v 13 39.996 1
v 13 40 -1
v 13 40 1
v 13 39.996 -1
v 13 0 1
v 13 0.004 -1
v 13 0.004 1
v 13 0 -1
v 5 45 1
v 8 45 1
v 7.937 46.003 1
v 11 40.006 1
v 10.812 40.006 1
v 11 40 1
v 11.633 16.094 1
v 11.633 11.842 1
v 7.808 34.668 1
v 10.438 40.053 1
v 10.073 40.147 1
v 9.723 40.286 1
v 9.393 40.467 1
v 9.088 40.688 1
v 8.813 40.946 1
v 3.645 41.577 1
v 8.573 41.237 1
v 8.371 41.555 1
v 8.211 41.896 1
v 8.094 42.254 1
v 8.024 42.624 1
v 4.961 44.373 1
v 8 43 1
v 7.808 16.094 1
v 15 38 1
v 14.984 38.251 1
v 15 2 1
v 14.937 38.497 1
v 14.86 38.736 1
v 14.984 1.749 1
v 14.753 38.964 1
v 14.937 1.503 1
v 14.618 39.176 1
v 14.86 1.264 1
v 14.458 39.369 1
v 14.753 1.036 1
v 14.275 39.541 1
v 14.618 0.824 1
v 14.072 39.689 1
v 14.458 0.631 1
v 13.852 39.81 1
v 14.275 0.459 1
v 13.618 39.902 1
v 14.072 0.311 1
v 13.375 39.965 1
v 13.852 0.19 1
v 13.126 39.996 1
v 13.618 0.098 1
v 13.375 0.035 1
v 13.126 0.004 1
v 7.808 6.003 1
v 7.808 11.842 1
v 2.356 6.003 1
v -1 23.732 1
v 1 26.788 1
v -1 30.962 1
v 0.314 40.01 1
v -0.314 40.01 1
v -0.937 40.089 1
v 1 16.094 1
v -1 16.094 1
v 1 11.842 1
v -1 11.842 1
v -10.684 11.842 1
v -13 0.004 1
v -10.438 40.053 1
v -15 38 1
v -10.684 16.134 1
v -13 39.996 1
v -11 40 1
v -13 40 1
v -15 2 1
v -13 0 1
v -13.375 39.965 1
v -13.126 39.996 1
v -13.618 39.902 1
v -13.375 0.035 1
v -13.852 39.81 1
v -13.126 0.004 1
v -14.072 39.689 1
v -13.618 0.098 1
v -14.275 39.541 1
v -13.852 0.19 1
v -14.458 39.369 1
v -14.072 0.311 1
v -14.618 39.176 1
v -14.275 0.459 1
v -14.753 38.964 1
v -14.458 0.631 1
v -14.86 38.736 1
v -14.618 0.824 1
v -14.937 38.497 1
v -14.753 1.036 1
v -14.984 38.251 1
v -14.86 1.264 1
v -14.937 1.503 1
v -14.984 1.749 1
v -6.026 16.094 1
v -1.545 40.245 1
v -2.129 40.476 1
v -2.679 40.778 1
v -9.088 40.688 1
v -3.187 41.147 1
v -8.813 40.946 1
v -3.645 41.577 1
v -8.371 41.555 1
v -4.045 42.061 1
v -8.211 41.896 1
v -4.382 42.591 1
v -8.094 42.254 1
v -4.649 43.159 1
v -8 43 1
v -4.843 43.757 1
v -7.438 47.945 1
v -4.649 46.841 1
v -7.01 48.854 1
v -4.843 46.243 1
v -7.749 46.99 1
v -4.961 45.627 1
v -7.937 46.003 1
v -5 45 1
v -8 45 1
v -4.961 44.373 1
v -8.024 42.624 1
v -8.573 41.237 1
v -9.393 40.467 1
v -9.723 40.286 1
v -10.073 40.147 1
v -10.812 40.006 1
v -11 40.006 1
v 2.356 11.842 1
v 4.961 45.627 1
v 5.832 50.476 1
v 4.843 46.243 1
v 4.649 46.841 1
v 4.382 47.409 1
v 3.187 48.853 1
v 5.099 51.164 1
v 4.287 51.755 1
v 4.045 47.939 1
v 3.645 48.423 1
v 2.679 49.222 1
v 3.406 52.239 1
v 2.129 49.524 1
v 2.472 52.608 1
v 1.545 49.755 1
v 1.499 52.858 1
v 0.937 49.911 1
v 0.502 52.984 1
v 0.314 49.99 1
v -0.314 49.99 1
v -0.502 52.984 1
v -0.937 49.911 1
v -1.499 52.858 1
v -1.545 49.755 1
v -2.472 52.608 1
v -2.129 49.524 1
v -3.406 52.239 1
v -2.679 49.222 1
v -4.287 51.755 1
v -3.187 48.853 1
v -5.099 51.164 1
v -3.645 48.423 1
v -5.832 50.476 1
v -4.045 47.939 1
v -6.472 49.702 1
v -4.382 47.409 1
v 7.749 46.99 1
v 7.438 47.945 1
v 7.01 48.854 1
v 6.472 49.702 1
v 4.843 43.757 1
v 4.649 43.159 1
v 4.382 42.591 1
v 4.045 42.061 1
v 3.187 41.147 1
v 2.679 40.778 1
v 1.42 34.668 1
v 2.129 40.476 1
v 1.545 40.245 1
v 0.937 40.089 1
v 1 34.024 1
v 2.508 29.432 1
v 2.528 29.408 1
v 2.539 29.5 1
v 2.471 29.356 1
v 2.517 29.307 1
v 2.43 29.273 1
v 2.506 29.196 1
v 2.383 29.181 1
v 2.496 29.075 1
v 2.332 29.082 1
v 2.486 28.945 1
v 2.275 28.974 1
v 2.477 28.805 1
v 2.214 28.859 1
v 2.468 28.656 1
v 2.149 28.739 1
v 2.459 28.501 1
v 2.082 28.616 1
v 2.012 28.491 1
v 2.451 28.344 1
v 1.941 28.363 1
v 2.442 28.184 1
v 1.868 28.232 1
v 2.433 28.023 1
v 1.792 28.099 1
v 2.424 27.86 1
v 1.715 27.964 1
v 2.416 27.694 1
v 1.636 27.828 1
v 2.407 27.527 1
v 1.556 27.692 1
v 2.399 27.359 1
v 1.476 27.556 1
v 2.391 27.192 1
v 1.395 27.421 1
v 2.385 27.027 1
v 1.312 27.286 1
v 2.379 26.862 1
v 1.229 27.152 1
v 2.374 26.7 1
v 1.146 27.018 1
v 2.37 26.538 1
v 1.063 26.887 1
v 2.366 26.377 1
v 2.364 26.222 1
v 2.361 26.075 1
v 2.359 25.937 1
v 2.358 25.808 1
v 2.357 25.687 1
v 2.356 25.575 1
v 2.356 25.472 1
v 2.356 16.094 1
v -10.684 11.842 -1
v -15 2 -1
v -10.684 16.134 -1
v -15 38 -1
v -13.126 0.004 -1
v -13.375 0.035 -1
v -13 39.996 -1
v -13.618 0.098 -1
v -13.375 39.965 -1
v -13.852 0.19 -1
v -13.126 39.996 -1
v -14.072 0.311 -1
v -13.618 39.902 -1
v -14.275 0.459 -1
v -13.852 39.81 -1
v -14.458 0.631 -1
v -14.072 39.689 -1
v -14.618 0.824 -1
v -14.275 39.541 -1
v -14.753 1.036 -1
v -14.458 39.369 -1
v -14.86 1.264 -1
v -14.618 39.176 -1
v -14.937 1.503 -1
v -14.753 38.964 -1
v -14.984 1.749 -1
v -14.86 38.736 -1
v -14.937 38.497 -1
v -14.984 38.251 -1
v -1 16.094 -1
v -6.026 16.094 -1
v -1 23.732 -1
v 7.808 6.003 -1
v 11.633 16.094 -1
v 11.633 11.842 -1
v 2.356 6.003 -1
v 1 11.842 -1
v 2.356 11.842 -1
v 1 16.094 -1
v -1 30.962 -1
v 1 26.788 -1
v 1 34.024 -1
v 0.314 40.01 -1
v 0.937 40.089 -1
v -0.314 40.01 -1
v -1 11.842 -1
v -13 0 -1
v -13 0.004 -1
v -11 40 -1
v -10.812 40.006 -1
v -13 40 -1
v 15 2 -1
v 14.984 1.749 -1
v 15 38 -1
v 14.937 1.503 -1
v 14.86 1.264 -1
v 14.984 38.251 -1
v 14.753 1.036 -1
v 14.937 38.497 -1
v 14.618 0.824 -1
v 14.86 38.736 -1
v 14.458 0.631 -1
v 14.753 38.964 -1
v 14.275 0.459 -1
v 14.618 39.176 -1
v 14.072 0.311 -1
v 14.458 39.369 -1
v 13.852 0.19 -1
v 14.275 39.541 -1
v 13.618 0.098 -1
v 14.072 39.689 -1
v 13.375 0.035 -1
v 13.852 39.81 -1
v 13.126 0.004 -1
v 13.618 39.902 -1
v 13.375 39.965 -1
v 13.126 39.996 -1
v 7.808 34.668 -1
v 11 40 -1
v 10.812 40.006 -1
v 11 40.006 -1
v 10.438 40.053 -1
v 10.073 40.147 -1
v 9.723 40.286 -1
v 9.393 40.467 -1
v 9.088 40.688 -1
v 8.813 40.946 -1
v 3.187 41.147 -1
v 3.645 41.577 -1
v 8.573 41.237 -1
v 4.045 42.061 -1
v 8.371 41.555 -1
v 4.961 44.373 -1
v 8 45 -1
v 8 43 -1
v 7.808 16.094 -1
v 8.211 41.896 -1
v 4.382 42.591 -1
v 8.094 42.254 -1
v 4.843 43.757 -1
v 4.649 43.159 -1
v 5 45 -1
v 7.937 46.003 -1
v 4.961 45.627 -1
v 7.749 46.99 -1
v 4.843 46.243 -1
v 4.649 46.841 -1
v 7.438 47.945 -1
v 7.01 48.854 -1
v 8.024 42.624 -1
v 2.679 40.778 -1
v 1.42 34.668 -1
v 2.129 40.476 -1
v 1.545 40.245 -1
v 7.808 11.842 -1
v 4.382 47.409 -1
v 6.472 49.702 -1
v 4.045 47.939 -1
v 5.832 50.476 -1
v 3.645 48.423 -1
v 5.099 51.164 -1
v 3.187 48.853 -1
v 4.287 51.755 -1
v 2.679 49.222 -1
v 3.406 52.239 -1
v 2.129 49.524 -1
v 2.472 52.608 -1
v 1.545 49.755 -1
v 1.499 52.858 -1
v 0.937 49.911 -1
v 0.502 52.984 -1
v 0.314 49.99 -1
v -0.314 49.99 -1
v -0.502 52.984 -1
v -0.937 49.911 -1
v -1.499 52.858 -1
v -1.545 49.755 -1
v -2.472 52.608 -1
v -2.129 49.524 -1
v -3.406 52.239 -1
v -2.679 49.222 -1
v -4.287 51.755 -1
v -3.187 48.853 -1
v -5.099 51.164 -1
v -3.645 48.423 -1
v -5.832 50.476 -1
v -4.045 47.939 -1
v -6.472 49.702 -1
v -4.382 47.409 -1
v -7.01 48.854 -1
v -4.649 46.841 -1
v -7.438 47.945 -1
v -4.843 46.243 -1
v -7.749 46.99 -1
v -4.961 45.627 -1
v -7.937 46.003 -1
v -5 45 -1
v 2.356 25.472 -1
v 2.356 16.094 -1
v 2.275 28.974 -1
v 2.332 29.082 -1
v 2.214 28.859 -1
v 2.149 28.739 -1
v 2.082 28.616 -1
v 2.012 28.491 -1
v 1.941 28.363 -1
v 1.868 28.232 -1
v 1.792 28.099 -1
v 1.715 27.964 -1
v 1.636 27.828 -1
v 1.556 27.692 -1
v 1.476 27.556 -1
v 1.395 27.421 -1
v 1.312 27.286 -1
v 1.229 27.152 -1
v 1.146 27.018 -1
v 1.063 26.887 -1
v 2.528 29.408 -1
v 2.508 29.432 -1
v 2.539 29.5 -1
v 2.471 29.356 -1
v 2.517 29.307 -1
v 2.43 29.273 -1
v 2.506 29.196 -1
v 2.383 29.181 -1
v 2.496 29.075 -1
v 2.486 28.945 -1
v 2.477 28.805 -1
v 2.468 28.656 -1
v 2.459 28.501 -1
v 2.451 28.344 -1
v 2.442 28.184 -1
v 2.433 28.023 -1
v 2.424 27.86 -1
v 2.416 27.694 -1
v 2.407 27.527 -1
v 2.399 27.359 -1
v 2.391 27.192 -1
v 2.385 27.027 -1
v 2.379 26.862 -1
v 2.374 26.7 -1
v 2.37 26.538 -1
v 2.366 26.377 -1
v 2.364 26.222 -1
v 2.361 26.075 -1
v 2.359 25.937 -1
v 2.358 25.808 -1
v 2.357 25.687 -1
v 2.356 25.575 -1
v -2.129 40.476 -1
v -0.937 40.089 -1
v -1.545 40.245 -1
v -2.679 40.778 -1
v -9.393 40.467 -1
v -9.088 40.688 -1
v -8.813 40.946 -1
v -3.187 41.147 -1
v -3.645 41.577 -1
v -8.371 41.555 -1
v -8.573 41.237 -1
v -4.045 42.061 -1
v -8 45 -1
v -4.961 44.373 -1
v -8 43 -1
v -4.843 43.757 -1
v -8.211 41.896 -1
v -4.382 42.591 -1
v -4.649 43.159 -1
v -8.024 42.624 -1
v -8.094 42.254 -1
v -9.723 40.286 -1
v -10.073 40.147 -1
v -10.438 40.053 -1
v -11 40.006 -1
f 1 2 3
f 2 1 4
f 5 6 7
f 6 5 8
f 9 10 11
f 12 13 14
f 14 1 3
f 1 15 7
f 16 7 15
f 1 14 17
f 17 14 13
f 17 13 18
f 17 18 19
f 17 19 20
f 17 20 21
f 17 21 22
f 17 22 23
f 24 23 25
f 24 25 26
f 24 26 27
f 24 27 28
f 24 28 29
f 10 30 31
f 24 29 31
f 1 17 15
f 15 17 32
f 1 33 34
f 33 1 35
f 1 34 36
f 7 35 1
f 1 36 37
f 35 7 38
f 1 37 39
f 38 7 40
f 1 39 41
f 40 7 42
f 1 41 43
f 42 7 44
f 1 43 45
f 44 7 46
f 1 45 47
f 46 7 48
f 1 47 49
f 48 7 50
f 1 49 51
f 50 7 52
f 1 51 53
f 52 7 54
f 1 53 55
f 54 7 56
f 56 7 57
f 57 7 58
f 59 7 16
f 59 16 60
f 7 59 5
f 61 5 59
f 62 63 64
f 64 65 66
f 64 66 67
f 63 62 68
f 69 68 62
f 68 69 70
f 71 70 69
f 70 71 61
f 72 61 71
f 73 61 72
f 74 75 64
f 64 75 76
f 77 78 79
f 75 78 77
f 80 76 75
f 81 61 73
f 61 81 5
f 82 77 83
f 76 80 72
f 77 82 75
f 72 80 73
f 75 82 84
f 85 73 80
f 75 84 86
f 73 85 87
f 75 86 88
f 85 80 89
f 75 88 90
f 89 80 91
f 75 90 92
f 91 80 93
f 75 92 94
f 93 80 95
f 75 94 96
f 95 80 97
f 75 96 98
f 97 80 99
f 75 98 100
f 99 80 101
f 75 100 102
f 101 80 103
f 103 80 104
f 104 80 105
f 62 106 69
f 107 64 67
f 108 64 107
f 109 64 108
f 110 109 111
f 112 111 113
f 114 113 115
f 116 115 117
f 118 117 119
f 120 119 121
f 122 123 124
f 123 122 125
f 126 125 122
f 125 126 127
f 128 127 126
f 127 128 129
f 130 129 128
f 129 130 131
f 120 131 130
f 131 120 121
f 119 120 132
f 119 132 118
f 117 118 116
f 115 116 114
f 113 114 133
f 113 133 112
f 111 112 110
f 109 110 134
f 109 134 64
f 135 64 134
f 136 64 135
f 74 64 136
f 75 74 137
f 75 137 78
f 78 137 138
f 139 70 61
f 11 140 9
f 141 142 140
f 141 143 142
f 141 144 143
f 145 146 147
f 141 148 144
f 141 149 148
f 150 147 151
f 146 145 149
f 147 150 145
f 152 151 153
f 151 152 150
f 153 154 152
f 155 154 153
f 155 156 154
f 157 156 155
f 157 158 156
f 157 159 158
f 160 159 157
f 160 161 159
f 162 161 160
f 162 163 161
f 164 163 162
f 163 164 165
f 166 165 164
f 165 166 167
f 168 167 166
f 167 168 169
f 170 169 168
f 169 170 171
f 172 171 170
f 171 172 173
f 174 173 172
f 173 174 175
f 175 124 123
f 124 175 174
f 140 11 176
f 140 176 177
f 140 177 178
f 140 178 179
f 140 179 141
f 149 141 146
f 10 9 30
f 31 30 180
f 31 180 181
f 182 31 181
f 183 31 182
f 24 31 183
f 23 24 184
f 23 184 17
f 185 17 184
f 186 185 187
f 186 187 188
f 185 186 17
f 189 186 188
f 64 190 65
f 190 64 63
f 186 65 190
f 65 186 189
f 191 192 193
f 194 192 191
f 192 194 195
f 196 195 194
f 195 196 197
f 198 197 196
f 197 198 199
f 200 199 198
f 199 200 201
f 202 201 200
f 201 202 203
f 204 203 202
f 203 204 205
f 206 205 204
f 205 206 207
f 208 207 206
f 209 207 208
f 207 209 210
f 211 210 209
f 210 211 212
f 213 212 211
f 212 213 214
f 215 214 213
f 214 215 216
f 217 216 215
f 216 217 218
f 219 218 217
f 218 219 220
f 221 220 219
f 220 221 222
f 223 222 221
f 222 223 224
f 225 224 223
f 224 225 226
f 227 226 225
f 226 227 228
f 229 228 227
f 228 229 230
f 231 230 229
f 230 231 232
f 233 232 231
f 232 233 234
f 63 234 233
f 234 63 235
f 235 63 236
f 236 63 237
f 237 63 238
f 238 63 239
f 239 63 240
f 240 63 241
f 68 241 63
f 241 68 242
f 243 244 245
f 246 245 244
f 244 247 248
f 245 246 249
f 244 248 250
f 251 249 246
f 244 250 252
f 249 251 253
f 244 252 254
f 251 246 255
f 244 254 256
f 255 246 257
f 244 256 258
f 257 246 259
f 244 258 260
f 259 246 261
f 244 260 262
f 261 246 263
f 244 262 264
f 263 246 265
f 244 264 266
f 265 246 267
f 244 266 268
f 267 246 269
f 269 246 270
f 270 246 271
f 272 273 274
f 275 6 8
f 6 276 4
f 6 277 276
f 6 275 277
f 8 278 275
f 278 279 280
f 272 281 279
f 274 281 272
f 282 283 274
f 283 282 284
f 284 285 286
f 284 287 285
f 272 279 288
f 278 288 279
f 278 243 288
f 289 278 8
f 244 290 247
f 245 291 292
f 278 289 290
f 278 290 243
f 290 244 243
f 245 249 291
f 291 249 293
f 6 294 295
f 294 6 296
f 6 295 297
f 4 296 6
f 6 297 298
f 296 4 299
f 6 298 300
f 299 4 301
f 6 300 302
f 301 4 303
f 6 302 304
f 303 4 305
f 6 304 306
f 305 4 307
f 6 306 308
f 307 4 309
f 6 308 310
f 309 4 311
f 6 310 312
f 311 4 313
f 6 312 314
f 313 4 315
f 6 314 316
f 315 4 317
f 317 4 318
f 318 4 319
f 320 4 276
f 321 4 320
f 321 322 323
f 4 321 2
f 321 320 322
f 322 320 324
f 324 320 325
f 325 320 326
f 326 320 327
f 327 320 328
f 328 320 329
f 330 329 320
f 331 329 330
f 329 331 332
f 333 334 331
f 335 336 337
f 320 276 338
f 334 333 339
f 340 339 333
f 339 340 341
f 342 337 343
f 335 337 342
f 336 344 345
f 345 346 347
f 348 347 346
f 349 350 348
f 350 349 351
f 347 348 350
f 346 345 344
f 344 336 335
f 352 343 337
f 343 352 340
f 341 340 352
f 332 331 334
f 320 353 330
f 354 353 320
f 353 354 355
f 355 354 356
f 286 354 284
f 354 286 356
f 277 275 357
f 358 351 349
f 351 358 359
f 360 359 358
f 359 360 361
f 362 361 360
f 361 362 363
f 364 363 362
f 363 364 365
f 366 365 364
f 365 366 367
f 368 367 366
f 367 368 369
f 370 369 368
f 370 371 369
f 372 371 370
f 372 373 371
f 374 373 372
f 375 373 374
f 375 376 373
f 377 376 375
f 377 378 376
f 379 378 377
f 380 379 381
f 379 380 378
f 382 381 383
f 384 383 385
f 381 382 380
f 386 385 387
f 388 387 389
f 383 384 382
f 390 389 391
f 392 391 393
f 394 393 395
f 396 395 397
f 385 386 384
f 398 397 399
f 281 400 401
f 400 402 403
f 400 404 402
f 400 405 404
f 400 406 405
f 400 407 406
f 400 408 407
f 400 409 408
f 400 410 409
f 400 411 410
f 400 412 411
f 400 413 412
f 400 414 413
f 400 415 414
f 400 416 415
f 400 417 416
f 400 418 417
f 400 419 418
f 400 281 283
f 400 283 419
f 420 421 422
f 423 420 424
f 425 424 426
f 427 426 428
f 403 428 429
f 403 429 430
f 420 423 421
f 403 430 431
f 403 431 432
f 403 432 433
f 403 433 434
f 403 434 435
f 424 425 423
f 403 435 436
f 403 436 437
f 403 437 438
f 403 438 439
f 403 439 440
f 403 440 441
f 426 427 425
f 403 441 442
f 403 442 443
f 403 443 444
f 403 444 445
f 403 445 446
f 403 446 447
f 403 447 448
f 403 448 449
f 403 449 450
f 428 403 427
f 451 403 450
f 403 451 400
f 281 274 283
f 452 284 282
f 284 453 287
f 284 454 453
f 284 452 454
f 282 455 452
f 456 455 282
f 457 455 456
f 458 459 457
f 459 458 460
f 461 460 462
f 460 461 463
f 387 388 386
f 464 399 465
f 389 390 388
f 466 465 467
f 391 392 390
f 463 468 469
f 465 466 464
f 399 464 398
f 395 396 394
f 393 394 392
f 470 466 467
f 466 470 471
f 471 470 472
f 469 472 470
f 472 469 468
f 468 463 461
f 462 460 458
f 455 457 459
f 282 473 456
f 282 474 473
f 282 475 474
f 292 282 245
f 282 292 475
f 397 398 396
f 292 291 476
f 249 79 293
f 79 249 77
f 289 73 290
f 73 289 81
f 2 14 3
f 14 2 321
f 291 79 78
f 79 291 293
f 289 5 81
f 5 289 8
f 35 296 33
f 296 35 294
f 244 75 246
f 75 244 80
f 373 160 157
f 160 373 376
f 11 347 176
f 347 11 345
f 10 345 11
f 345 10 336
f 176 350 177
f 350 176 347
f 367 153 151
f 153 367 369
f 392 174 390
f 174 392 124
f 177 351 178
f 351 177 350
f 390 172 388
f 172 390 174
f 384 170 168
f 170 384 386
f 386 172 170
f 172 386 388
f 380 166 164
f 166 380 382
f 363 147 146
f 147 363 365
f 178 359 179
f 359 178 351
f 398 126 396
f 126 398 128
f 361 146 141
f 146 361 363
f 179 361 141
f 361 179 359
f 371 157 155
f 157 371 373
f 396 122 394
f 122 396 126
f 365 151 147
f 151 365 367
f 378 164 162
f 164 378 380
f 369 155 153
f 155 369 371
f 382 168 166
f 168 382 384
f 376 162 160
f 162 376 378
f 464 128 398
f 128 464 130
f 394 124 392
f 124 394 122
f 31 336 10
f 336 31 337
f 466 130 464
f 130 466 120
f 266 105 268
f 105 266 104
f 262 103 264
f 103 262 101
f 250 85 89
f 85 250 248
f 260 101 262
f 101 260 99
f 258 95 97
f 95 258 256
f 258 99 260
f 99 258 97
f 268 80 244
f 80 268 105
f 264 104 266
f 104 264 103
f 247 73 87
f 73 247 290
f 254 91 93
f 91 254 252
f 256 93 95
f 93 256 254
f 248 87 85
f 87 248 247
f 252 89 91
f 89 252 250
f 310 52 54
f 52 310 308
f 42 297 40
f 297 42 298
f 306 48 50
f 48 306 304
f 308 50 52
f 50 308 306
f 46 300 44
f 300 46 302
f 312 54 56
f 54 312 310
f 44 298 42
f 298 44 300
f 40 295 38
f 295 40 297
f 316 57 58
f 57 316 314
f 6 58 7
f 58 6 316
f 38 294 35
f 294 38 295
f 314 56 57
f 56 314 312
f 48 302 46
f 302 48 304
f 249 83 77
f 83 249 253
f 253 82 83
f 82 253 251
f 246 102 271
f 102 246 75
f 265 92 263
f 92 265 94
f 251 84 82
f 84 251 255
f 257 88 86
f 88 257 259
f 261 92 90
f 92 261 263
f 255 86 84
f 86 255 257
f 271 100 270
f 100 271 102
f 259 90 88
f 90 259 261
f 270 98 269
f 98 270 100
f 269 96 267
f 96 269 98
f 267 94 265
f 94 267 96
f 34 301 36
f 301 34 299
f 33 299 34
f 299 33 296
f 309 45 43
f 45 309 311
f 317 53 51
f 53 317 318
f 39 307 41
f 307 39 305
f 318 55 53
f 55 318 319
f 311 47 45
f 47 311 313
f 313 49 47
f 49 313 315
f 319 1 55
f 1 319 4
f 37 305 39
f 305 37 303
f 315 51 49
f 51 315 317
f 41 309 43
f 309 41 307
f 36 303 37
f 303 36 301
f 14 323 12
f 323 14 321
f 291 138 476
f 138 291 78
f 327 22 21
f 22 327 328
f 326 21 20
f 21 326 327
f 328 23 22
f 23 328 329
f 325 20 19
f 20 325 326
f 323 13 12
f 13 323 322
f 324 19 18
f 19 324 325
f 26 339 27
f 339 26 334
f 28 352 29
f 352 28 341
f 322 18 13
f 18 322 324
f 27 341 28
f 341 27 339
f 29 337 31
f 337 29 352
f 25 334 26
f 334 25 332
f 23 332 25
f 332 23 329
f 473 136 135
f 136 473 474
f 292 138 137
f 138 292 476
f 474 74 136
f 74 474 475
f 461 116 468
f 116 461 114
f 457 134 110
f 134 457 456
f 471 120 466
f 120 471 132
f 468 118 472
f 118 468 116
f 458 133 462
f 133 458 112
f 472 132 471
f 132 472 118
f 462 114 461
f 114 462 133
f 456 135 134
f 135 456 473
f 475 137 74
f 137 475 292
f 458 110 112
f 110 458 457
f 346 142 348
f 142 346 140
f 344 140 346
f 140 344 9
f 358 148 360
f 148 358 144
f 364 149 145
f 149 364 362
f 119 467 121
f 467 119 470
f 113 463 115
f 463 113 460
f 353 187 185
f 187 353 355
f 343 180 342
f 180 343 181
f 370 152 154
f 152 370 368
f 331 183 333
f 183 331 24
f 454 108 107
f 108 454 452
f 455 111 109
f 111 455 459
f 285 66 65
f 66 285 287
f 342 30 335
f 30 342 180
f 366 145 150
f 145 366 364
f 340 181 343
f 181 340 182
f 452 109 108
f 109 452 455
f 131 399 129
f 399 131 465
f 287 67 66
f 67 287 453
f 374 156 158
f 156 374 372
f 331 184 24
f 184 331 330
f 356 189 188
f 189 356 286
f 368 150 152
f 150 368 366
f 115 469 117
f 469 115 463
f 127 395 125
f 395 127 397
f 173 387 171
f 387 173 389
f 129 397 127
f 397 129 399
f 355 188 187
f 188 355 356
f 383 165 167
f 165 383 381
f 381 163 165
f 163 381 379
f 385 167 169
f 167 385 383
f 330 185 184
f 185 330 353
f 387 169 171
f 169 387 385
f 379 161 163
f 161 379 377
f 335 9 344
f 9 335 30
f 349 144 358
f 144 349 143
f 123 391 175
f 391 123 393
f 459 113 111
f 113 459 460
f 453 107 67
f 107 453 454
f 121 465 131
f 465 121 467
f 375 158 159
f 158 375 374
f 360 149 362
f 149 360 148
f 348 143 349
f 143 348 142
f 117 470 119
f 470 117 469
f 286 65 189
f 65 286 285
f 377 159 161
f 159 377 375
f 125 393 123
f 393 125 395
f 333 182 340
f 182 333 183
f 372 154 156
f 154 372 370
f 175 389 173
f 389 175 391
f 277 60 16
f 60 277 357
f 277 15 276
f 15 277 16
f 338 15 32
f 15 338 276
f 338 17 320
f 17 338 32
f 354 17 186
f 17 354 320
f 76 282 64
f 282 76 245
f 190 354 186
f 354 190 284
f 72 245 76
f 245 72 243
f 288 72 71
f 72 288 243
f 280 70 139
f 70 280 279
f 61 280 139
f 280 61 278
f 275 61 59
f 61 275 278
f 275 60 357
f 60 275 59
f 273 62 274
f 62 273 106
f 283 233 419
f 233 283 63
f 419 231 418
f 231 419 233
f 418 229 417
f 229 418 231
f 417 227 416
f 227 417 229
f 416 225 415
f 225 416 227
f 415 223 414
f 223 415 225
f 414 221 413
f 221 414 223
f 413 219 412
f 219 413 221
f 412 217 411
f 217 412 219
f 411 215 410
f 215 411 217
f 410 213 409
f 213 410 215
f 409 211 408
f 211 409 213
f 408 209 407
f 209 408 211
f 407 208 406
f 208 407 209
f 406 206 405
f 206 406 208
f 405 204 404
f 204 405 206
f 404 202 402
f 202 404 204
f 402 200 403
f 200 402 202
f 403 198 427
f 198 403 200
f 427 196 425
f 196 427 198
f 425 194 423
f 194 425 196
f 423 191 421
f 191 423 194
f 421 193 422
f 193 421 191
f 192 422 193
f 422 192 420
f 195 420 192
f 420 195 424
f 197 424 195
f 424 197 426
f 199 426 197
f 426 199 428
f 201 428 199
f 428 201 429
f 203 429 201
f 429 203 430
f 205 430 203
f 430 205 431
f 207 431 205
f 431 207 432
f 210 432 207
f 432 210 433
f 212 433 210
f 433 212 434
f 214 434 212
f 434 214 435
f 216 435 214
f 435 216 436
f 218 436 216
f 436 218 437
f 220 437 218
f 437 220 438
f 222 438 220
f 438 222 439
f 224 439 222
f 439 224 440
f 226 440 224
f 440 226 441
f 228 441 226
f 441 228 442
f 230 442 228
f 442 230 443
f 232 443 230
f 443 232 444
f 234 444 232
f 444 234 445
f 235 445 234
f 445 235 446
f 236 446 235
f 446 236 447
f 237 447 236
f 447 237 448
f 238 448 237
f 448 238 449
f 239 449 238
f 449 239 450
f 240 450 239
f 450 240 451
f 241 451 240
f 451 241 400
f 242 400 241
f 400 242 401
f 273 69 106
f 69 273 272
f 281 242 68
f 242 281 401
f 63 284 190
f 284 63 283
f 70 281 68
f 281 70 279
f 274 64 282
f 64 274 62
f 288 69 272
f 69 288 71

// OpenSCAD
HEIGHT=40;
WIDTH=30;
HOLE=5;
THICKNESS=2;
FILLET=2;
LOOP_PAD=3;
CENTER_PIECE=2; // 0 for none
TAG="4";


hideTheNoneParameters();
module hideTheNoneParameters() {
    $fn=50;
    cornerFilletXOffset = WIDTH/2-FILLET;
    cornerFilletYOffset = HEIGHT-FILLET;
    holePad=HOLE+LOOP_PAD;

    difference() {
        union() {
            // Corner fillets
            translate([-cornerFilletXOffset, FILLET, 0])
                cylinder(h=THICKNESS, r=FILLET, center=true);
            translate([cornerFilletXOffset, FILLET, 0])
                cylinder(h=THICKNESS, r=FILLET, center=true);
            translate([-cornerFilletXOffset, cornerFilletYOffset, 0])
                cylinder(h=THICKNESS, r=FILLET, center=true);
            translate([cornerFilletXOffset, cornerFilletYOffset, 0])
                cylinder(h=THICKNESS, r=FILLET, center=true);
            // Base fillings
            translate([0, HEIGHT/2, 0]) {
                cube([WIDTH-2*FILLET, HEIGHT, THICKNESS], center=true);
                cube([WIDTH, HEIGHT-2*FILLET, THICKNESS], center=true);
            }
            // Loop
            translate([0, HEIGHT+HOLE, 0]) {
                cylinder(r=holePad, h=THICKNESS, center=true);
                translate([0, -holePad/2, 0])
                    cube([2*holePad, holePad, 2], center=true);
            }
            // Loop fillet - the block
            translate([holePad+LOOP_PAD/2, HEIGHT+LOOP_PAD/2, 0])
                cube([LOOP_PAD, LOOP_PAD, THICKNESS],  center=true);
            translate([-(holePad+LOOP_PAD/2), HEIGHT+LOOP_PAD/2, 0])
                cube([LOOP_PAD, LOOP_PAD, THICKNESS],  center=true);
        }
        // Loop fillet 
        translate([holePad+LOOP_PAD, HEIGHT+LOOP_PAD, 0])
            cylinder(r=LOOP_PAD, h=THICKNESS+1,  center=true);
        translate([-(holePad+LOOP_PAD), HEIGHT+LOOP_PAD, 0])
            cylinder(r=LOOP_PAD, h=THICKNESS+1,  center=true);
        
        // Loop hole
        translate([0, HEIGHT+HOLE, 0])
            cylinder(r=HOLE, h=THICKNESS+1, center=true);

        // Text
        translate([0, HEIGHT/2, 0]) {
            linear_extrude(height=THICKNESS+1, center=true) {
                text(TAG, font = "Liberation Sans:style=Bold", size=30, halign="center", valign="center");
            }
        }
    }

    translate([0, HEIGHT/2])
        cube([CENTER_PIECE, HEIGHT-2, THICKNESS], center=true);
}
